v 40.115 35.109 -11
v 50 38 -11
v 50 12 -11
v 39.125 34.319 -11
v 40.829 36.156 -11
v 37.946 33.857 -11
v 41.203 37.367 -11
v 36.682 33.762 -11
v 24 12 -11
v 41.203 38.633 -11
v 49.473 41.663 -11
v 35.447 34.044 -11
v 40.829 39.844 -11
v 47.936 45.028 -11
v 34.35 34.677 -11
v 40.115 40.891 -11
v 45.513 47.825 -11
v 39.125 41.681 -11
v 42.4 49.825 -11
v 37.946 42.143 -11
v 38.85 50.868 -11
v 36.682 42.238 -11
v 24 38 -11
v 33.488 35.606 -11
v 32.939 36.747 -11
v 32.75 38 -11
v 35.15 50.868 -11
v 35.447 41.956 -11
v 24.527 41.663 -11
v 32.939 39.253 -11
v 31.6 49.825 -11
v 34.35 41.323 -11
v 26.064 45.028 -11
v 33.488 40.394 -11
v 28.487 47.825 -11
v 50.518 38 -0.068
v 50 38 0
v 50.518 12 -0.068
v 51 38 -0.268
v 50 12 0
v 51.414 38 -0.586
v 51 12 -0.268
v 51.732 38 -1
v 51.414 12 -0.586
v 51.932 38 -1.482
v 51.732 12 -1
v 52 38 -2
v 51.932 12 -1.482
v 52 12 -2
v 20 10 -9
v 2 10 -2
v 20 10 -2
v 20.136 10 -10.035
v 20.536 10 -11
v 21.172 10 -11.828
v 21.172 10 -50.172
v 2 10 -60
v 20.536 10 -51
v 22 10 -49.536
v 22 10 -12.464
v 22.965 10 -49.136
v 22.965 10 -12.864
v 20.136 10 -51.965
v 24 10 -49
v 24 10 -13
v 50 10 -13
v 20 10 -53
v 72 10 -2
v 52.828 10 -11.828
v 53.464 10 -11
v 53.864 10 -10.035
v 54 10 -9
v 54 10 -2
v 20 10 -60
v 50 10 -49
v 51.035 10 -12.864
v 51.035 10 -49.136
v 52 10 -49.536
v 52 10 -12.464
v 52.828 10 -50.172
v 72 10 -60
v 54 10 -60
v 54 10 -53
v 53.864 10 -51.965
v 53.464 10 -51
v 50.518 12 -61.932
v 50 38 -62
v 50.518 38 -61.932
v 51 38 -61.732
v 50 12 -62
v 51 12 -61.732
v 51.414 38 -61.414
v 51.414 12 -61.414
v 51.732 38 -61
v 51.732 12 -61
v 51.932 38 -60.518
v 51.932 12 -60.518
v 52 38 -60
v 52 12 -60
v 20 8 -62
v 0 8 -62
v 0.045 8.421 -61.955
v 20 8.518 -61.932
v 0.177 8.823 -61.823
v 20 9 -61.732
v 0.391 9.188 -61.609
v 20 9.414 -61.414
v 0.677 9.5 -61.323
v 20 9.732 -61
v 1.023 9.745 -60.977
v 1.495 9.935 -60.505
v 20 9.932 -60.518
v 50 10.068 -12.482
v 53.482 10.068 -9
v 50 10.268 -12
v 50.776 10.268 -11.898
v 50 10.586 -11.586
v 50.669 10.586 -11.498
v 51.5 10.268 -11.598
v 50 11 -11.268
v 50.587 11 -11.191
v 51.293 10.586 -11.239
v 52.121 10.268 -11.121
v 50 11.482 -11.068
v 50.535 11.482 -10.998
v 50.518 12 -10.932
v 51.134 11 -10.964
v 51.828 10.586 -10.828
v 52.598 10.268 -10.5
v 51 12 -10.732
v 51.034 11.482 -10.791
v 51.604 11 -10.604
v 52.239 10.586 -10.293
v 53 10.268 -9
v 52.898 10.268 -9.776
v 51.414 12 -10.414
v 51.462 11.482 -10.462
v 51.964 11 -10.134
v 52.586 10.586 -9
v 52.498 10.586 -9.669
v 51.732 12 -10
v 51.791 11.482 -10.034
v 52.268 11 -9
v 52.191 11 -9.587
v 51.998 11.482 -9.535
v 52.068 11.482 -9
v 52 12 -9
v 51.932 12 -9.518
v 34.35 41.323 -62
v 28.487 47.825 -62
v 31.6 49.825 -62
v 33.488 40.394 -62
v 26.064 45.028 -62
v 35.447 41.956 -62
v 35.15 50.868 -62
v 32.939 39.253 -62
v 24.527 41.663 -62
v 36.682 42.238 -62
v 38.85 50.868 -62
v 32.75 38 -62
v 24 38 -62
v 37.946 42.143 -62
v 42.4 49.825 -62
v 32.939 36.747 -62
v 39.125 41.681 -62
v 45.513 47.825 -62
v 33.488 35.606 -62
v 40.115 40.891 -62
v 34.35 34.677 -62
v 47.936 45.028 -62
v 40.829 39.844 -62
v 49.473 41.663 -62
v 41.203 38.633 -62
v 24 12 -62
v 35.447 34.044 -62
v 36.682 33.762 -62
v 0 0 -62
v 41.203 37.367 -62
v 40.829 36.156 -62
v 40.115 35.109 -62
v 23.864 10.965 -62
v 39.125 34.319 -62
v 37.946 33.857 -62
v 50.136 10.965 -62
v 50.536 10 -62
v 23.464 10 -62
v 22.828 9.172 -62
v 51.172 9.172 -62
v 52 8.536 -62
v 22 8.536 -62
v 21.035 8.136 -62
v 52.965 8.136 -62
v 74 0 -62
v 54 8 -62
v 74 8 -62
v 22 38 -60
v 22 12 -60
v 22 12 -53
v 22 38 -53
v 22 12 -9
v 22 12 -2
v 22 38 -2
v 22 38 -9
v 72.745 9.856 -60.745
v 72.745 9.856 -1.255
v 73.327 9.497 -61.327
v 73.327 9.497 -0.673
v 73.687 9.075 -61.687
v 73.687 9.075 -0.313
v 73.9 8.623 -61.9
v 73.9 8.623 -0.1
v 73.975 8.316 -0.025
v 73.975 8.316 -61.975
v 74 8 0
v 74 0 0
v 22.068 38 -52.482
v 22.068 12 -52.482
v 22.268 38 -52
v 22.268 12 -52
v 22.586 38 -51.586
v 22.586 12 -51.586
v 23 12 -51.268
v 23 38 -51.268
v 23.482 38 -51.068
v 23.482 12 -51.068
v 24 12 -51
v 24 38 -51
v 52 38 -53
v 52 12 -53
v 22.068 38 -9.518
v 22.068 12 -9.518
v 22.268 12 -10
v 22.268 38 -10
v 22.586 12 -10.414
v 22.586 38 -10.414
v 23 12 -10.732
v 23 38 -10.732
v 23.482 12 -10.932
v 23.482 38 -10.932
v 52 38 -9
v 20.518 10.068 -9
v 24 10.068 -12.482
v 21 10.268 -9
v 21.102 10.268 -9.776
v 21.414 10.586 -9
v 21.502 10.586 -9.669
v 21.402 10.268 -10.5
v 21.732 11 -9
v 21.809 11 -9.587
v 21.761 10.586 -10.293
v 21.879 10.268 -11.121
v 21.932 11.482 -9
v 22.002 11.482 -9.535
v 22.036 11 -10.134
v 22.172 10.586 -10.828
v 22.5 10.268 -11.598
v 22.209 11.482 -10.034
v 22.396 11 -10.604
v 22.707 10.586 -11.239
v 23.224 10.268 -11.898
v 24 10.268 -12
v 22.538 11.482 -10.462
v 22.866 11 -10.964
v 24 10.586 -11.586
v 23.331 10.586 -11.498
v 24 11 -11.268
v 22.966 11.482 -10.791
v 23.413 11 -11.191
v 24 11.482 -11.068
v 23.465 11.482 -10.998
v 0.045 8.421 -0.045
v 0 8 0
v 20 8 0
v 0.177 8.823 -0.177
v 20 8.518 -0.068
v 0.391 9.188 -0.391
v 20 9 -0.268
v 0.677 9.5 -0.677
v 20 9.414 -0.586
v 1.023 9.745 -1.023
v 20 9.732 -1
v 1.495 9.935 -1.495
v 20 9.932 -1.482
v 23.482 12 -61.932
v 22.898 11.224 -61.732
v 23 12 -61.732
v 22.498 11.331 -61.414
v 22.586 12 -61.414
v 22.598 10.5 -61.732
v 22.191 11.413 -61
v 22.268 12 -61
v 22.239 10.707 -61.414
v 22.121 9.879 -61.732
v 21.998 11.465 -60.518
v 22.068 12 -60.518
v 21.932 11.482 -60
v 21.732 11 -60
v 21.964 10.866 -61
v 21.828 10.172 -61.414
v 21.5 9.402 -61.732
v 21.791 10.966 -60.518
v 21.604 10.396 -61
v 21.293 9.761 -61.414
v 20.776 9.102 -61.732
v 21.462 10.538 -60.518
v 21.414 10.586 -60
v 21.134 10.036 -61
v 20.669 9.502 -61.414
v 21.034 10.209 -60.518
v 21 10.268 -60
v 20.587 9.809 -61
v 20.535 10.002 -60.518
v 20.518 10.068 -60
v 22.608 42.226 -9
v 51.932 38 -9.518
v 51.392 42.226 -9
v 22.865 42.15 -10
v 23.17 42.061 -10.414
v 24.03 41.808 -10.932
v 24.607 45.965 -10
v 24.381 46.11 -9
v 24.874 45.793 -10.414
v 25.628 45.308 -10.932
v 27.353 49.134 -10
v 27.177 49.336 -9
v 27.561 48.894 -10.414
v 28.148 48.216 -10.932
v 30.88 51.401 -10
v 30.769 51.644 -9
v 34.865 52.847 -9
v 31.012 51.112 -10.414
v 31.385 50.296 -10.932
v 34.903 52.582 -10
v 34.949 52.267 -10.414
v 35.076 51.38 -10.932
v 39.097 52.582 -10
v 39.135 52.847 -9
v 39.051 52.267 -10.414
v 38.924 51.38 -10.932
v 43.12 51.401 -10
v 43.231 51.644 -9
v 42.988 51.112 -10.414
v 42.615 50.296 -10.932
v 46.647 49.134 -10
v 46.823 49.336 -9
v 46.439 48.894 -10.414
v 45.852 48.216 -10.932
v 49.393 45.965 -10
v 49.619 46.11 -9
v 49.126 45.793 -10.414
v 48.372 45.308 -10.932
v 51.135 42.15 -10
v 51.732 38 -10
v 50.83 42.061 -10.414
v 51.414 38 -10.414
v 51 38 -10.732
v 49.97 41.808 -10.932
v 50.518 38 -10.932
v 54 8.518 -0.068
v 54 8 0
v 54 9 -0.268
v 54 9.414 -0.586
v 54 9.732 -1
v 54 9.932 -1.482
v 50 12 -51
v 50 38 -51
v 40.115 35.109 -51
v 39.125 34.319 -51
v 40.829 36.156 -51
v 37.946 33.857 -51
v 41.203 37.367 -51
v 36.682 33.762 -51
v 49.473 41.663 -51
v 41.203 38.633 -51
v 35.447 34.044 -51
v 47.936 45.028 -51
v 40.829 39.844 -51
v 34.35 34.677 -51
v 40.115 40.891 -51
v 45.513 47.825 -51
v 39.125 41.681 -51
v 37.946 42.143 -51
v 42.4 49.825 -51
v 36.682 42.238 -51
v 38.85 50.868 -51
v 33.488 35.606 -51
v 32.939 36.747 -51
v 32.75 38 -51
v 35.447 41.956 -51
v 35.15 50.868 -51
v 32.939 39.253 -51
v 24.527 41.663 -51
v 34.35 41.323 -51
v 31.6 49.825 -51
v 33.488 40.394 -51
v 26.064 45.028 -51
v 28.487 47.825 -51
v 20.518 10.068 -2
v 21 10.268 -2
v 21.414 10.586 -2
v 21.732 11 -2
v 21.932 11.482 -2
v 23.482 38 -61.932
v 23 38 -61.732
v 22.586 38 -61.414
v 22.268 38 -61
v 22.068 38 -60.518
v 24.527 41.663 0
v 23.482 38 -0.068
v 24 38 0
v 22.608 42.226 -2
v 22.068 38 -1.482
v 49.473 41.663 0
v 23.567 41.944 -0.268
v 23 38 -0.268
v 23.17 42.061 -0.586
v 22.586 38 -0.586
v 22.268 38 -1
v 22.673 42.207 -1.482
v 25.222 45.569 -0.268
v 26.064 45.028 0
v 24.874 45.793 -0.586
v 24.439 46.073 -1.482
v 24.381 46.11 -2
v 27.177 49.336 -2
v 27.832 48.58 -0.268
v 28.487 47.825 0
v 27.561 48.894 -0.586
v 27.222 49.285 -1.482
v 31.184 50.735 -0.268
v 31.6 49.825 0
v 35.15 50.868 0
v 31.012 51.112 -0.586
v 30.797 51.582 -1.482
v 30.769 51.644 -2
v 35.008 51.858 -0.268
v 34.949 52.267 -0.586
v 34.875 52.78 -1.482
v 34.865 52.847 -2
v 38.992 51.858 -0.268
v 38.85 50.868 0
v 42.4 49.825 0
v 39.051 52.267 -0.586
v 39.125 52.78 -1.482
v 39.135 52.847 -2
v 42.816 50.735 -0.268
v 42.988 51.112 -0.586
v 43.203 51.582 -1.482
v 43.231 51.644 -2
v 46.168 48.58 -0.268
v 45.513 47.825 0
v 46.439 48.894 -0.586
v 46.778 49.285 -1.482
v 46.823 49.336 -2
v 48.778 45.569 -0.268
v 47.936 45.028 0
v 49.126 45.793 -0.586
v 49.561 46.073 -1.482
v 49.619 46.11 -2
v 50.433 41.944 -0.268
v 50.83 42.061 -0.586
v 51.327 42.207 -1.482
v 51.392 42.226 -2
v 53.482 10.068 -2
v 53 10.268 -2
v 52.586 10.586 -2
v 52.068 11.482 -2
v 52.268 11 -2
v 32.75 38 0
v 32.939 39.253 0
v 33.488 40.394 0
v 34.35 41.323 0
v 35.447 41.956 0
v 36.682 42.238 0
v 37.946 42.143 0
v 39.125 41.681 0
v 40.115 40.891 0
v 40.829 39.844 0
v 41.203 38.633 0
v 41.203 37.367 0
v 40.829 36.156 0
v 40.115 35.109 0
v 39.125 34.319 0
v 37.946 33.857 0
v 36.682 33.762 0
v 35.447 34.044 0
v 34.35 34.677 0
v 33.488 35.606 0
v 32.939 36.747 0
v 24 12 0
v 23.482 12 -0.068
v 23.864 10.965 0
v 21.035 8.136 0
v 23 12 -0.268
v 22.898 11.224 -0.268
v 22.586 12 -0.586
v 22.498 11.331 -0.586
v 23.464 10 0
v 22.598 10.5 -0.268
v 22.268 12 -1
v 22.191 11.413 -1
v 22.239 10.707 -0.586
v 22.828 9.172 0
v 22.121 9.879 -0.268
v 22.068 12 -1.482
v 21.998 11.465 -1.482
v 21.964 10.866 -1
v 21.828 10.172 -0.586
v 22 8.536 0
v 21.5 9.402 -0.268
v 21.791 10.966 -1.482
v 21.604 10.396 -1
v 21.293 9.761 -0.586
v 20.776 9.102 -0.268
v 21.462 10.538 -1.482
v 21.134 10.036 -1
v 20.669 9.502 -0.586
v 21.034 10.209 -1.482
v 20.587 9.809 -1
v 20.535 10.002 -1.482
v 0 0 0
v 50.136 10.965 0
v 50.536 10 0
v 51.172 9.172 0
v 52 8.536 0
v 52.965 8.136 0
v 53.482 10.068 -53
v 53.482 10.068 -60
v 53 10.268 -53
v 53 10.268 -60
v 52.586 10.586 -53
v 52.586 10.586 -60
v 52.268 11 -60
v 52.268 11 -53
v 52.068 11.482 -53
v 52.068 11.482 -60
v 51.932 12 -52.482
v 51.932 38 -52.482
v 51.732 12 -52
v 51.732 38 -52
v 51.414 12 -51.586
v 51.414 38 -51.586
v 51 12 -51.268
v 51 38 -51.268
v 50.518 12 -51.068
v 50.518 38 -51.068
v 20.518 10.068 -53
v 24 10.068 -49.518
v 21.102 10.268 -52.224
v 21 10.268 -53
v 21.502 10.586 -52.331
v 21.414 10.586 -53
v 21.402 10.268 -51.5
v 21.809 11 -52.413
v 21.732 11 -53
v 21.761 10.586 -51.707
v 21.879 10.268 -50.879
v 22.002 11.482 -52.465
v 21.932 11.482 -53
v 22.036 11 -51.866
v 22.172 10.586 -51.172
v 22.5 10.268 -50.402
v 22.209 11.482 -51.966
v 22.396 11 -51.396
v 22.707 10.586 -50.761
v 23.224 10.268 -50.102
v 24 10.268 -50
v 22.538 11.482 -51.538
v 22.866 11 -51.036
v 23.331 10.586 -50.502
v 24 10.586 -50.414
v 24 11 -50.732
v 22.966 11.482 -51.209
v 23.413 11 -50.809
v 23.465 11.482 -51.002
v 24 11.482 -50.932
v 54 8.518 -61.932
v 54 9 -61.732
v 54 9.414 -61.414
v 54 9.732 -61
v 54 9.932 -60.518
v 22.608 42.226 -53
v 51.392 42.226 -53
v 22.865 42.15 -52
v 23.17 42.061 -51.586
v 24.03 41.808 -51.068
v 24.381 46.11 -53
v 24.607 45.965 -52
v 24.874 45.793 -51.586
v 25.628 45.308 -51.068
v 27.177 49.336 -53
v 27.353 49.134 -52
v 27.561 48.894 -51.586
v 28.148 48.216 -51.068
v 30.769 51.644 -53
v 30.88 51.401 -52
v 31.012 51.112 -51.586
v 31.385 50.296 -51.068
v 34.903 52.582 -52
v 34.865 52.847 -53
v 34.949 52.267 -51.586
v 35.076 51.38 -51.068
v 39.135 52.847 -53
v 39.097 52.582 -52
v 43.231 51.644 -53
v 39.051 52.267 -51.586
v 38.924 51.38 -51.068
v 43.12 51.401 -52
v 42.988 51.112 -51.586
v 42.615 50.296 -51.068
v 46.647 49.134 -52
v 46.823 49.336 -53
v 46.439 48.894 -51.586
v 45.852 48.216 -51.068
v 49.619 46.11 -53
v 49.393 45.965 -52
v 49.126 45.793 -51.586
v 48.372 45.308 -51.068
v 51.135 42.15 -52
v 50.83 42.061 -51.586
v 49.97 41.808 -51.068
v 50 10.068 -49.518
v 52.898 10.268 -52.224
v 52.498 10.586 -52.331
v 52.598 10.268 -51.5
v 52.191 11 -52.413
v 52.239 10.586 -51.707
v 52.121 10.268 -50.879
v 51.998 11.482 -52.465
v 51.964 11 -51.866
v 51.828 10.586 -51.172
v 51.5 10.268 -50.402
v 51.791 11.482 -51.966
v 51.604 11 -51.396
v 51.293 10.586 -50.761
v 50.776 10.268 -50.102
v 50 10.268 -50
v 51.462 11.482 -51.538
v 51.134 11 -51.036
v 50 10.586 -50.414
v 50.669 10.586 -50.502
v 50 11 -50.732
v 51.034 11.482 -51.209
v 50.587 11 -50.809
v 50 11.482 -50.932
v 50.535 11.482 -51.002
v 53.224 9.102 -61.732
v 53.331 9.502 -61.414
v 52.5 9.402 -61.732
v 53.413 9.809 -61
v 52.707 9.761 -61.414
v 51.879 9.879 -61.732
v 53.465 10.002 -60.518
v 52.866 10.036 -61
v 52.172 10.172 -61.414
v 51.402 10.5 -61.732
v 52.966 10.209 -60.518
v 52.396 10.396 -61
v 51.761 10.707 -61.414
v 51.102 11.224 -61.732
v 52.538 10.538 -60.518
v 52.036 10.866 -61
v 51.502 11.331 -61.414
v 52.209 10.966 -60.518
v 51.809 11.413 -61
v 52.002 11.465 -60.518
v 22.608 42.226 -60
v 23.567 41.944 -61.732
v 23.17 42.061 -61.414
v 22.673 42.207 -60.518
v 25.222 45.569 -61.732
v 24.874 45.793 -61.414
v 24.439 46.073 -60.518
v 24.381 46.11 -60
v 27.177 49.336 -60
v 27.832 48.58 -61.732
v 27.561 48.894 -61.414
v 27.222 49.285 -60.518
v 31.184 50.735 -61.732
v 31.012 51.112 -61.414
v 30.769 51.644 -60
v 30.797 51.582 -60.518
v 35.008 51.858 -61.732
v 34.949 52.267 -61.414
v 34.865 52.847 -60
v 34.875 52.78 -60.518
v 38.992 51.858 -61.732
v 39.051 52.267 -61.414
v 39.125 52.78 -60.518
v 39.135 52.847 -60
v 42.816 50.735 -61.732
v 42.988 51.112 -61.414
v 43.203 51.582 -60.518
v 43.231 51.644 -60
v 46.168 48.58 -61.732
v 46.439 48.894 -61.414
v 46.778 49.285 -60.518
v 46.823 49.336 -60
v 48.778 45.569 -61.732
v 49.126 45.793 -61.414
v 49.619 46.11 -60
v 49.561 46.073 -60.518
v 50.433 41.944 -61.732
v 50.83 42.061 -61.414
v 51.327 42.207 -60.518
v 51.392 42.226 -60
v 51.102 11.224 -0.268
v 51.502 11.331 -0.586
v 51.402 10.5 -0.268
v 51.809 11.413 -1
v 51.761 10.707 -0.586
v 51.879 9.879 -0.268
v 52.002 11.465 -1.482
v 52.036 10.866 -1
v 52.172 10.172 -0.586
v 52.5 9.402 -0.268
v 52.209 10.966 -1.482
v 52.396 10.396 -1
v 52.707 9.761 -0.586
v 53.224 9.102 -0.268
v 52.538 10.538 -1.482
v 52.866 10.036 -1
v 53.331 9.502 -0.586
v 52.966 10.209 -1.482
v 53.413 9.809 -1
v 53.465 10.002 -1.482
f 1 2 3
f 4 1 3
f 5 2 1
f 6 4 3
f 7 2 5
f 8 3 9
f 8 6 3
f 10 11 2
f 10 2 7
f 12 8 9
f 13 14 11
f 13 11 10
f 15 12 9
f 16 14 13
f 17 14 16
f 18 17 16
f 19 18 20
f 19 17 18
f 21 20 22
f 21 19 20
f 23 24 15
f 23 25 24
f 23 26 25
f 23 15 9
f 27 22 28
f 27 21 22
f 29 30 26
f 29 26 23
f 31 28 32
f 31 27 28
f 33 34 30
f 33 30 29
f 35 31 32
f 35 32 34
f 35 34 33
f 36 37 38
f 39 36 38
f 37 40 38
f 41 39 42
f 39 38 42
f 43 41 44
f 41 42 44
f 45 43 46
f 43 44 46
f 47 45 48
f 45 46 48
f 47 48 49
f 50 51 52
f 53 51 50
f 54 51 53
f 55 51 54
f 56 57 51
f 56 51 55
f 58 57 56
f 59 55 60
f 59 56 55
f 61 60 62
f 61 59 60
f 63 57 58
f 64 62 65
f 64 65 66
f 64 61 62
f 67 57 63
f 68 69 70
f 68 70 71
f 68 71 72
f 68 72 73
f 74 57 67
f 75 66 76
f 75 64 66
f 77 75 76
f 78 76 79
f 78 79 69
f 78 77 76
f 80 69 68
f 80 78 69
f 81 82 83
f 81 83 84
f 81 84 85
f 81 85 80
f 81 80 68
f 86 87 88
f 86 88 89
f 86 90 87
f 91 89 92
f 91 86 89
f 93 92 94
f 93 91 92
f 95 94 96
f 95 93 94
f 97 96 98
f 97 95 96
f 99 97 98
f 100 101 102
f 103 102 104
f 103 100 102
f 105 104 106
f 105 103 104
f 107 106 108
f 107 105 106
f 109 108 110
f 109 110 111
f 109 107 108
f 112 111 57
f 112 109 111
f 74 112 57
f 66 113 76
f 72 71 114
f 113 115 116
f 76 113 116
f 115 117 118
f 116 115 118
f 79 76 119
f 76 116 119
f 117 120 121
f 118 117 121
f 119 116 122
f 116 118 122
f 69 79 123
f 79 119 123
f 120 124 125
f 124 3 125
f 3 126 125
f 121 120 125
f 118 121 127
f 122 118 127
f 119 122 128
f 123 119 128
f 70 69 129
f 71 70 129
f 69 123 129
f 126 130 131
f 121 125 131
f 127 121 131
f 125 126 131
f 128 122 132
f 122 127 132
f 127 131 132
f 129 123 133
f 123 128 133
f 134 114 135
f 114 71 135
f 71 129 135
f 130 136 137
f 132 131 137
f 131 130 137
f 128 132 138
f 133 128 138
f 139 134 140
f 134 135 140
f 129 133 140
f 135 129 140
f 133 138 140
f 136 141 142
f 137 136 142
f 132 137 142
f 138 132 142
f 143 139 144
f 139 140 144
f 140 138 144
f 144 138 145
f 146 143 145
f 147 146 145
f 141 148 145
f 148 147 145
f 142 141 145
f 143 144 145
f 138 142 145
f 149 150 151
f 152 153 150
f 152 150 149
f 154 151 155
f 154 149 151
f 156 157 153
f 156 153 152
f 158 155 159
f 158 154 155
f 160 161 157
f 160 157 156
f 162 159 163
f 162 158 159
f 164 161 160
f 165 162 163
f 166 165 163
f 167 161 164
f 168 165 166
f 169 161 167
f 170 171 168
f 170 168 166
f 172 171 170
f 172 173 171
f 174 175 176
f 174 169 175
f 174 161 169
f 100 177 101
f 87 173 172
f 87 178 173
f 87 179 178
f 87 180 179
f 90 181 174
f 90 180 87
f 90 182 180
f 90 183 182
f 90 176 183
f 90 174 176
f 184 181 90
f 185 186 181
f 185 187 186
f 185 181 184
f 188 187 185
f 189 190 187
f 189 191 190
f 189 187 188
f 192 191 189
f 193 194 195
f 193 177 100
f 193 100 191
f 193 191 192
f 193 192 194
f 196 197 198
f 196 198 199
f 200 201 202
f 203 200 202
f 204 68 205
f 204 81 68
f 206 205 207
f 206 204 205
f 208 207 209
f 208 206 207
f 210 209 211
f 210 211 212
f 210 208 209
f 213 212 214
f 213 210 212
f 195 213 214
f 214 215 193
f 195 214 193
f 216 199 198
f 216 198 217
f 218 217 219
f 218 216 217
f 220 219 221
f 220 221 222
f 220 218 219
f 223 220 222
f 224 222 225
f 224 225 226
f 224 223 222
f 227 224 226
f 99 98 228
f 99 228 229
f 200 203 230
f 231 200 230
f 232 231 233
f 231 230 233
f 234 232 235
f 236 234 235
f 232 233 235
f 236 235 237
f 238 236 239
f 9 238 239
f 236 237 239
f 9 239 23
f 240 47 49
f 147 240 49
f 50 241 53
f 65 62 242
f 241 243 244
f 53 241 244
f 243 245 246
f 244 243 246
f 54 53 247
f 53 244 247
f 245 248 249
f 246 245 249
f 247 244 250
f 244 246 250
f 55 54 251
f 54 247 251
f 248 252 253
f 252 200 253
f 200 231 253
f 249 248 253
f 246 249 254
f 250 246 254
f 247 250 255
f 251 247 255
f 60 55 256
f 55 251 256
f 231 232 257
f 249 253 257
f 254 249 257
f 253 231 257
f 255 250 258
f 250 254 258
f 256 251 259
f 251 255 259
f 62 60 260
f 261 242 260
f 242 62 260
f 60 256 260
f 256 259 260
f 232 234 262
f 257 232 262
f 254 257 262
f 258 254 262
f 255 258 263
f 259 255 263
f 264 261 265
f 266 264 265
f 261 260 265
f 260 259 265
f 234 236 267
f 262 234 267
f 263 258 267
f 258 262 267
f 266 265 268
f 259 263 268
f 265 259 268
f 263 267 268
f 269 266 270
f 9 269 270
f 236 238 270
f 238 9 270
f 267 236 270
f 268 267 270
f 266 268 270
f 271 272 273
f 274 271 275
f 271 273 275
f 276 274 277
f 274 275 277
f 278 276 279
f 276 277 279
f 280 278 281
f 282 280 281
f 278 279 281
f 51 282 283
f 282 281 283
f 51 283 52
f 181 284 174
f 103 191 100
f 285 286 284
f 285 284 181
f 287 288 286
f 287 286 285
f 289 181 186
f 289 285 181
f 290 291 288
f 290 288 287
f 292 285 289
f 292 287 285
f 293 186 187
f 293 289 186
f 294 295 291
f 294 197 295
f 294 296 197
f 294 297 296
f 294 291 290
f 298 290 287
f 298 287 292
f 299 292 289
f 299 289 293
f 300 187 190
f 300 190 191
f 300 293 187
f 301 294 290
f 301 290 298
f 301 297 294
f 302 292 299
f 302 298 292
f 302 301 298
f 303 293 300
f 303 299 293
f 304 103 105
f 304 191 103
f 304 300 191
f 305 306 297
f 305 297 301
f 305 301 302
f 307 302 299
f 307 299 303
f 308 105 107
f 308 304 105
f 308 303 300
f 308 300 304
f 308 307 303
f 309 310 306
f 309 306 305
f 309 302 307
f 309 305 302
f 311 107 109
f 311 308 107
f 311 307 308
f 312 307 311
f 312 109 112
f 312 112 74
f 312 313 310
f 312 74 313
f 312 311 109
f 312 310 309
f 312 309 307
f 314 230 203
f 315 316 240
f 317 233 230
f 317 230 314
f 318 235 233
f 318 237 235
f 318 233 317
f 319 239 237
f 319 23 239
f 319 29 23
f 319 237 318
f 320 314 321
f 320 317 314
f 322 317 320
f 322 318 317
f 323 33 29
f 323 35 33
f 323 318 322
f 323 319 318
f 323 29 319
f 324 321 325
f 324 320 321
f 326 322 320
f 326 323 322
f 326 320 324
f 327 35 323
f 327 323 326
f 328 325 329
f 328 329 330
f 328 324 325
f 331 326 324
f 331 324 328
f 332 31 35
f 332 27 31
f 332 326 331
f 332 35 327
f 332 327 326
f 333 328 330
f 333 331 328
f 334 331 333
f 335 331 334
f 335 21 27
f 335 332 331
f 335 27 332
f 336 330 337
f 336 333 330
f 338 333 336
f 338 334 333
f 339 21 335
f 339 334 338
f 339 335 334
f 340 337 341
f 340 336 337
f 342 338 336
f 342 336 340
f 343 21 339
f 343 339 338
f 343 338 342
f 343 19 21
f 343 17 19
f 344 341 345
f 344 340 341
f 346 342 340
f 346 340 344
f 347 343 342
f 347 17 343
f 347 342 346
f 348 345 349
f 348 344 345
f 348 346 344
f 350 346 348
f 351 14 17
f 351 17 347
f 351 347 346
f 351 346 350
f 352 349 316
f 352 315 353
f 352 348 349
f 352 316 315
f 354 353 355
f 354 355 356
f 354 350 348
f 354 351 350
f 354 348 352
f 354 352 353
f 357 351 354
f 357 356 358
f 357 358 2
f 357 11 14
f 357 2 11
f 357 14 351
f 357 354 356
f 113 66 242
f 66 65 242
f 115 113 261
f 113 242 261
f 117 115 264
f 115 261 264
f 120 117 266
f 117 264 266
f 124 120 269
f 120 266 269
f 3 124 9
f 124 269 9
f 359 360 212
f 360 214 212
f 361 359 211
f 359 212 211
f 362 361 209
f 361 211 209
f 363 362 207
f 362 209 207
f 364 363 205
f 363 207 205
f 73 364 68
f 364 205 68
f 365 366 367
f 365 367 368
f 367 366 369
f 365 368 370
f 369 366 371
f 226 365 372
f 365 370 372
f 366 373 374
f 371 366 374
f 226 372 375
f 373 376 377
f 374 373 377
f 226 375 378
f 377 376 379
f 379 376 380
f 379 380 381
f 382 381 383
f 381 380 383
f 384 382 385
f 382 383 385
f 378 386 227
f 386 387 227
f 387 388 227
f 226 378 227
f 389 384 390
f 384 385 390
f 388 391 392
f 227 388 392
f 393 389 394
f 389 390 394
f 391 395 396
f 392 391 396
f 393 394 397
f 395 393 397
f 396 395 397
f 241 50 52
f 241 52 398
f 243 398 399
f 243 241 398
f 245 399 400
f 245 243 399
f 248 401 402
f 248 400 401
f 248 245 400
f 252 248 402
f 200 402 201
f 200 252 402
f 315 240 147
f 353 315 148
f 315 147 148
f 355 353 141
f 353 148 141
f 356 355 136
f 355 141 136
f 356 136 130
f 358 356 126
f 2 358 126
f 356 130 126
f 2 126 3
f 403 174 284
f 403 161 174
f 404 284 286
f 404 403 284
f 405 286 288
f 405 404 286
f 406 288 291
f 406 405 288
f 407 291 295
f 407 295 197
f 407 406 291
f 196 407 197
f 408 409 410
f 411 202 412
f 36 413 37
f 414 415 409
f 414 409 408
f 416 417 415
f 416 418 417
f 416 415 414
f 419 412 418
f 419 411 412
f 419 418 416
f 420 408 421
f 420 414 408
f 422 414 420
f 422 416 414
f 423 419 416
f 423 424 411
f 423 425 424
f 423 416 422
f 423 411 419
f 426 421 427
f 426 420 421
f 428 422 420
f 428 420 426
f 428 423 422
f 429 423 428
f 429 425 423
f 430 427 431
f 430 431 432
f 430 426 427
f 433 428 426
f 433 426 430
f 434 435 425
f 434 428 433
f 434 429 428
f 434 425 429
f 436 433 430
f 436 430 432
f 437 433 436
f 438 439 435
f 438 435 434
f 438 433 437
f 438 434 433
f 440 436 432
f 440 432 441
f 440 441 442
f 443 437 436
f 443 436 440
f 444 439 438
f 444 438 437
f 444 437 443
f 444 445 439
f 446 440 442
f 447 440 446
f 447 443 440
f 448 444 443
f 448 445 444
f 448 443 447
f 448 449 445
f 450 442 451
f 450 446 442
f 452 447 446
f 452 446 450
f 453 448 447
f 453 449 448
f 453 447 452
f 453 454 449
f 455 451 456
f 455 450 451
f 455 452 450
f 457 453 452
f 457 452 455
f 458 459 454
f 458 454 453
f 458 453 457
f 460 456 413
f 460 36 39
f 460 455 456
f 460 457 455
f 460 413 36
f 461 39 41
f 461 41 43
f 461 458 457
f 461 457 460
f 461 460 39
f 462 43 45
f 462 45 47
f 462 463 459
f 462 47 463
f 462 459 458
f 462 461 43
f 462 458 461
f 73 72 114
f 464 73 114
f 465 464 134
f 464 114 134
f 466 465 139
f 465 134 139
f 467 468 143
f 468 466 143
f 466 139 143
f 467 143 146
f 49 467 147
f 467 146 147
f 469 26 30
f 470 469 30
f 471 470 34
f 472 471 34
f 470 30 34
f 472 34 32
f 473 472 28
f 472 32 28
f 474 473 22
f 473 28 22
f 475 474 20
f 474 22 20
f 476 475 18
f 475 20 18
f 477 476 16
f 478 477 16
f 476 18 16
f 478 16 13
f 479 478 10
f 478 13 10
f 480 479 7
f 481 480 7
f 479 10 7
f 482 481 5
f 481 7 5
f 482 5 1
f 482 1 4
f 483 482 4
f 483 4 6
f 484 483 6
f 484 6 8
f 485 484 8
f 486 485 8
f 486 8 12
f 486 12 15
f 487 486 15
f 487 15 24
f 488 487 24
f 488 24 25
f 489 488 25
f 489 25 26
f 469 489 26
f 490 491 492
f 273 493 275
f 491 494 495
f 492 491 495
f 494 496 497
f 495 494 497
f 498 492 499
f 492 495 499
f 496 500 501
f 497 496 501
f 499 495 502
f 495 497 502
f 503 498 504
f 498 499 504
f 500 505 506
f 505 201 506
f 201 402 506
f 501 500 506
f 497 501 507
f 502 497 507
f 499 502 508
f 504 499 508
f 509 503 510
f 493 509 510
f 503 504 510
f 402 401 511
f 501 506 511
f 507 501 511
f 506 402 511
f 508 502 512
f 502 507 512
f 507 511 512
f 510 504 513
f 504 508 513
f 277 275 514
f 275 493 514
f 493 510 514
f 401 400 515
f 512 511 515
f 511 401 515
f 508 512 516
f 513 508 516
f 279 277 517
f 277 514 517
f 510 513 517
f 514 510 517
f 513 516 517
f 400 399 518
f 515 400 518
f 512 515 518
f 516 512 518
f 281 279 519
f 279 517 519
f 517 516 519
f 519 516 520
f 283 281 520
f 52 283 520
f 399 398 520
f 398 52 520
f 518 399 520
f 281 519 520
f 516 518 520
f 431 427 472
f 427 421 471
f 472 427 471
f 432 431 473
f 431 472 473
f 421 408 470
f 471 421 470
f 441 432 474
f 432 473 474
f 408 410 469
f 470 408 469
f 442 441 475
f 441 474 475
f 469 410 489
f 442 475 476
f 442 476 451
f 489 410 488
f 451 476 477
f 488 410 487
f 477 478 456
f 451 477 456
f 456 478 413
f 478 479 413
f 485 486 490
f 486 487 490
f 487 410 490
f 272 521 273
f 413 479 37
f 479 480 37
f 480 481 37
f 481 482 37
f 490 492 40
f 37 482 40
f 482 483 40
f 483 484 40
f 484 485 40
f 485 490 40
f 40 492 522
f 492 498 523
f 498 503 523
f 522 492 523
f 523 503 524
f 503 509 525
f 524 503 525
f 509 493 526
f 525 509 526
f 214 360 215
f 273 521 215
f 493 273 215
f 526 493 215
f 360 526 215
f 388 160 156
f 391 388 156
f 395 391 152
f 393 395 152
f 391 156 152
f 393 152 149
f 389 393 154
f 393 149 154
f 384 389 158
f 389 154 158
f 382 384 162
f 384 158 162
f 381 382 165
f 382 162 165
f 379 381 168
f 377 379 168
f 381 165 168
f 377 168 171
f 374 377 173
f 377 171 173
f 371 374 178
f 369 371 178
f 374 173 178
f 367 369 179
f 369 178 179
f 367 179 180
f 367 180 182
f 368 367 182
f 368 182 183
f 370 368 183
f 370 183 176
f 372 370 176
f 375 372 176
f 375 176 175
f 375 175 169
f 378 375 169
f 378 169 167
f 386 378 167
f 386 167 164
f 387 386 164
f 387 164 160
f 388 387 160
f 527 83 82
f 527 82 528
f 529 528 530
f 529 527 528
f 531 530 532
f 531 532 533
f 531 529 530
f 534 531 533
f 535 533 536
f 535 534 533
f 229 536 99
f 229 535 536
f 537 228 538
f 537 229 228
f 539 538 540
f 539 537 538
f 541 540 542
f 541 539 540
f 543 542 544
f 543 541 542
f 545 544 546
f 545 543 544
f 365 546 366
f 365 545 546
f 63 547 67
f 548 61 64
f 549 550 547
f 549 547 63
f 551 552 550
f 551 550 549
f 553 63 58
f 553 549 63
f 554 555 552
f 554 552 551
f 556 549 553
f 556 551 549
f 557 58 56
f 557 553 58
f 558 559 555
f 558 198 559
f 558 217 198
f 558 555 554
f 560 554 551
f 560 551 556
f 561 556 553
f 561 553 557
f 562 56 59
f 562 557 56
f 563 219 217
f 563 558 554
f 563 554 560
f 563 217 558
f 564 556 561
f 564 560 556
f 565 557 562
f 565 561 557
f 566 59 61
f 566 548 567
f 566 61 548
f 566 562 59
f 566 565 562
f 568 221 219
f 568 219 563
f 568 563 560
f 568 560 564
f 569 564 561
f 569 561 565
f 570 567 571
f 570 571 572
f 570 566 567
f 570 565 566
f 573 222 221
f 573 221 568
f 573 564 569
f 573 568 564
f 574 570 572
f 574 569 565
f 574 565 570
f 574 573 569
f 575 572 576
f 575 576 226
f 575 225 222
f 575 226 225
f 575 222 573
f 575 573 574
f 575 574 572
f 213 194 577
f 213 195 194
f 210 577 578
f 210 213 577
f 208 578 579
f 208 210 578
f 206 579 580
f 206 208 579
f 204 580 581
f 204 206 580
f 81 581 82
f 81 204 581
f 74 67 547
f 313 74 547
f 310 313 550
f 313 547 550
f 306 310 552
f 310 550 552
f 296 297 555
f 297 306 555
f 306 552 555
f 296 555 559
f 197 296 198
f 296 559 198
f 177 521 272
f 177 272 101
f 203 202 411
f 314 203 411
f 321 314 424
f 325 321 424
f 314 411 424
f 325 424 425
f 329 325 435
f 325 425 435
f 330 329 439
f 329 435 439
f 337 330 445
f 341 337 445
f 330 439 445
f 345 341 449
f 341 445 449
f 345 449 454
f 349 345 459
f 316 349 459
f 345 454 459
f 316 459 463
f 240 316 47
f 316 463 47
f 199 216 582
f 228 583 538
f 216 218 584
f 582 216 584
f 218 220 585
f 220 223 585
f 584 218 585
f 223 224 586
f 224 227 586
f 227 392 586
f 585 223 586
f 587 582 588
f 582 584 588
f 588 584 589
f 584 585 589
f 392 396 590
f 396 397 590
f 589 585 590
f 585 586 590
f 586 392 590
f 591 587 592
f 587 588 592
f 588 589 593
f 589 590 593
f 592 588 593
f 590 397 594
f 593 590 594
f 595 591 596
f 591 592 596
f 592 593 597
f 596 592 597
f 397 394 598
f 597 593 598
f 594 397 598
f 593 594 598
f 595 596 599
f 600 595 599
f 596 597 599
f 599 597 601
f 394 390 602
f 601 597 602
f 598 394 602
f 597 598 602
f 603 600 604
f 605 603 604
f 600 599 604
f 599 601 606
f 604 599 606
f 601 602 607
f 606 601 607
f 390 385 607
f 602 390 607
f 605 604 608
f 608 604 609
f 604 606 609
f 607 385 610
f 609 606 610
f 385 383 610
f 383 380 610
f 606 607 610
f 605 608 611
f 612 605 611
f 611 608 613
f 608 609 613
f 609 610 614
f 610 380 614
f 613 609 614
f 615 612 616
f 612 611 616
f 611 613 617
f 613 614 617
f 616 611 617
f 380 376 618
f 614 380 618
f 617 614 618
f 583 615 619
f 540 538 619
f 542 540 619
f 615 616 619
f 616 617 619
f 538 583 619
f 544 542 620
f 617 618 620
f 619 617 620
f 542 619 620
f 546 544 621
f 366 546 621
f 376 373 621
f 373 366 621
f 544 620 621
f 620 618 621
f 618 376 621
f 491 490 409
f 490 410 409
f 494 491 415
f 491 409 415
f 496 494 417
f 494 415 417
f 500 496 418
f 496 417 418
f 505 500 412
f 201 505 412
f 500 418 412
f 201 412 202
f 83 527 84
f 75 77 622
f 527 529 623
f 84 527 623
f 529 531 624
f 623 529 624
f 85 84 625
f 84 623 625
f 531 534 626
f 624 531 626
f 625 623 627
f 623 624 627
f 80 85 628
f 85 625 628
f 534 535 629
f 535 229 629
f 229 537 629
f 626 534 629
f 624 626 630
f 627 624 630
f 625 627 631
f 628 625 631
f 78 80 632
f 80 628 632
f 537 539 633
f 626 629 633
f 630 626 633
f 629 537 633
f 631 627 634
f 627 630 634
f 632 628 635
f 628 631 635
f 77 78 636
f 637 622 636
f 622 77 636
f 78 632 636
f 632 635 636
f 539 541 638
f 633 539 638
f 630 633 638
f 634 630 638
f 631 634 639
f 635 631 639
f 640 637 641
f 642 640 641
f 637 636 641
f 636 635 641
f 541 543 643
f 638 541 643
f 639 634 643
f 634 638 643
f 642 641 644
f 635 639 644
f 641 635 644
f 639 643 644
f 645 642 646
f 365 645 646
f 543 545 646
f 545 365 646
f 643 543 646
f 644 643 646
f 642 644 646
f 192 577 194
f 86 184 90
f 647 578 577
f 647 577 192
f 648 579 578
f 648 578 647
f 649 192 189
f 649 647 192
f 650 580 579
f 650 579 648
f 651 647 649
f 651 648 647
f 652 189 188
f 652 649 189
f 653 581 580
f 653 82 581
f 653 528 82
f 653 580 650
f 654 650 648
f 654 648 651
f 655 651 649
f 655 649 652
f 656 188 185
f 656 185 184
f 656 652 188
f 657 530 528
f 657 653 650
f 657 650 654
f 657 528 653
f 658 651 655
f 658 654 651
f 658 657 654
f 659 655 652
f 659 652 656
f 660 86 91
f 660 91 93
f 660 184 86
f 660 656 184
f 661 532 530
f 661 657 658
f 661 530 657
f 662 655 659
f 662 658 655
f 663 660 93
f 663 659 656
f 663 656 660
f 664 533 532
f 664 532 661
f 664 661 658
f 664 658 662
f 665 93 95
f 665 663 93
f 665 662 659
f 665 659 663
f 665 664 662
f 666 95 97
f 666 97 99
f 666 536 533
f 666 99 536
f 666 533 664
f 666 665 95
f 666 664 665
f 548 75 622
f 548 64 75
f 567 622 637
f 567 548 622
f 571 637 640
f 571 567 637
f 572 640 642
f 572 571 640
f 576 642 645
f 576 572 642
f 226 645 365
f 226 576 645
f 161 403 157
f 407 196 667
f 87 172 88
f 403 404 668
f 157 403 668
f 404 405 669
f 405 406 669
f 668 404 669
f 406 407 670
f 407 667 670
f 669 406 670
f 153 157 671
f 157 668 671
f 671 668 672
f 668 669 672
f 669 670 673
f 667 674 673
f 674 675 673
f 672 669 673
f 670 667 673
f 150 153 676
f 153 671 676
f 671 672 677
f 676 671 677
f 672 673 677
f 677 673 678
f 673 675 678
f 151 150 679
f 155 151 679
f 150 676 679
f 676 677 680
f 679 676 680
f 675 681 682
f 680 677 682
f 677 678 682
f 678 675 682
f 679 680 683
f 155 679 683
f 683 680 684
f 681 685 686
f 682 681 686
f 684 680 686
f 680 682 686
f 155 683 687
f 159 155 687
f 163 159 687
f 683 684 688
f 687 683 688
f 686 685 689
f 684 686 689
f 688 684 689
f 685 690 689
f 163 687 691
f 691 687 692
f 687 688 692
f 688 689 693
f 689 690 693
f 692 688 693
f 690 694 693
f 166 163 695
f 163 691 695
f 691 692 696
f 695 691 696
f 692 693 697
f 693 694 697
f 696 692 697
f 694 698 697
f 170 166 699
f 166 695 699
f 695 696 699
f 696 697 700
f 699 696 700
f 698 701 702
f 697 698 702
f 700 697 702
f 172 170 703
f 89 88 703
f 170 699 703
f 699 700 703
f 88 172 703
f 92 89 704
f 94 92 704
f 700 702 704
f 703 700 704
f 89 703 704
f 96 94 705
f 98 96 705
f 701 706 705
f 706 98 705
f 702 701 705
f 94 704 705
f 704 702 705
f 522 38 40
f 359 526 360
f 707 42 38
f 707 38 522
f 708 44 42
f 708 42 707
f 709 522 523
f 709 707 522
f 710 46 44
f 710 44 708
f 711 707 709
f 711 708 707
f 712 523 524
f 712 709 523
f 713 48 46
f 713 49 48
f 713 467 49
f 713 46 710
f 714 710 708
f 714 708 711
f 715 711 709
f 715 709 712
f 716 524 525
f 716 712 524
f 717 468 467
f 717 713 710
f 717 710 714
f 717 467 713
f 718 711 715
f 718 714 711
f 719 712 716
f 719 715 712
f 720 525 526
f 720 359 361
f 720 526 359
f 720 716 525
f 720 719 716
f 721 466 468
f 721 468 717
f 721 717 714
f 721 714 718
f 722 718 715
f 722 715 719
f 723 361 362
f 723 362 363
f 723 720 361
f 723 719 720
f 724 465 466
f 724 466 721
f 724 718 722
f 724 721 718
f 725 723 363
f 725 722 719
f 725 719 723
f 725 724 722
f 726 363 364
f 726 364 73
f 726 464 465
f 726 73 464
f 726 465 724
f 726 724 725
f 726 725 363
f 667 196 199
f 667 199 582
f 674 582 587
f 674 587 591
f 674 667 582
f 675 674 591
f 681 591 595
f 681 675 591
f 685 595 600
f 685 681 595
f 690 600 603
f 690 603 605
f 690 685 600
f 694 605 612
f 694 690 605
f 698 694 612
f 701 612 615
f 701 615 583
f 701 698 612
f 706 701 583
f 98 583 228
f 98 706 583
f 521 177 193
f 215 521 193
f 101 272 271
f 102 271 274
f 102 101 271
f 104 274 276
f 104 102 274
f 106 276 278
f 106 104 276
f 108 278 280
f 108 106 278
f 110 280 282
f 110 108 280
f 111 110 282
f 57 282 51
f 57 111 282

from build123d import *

# Parameters (mm, degrees)
SKETCH2_W           = 74
SKETCH2_H           = 62
BOSS_EXTRUDE1_DEPTH = 10
BOSS_EXTRUDE2_DEPTH = 11
SKETCH5_R           = 4.25
CUT_EXTRUDE2_DEPTH  = 75
FILLET1_R           = 2


with BuildPart() as part:
    # Sketch2 → Boss-Extrude1 (new body)
    with BuildSketch(Plane(origin=(0, 0, 0), x_dir=(1, 0, 0), z_dir=(0, 1, 0))):
        with Locations((37, 31)):
            Rectangle(SKETCH2_W, SKETCH2_H)
    extrude(amount=BOSS_EXTRUDE1_DEPTH)

    # Sketch3 → Boss-Extrude2 (add)
    with BuildSketch(Plane.XY):
        with BuildLine():
            Line((22, 10), (22, 38))
            ThreePointArc((22, 38), (37, 53), (52, 38))
            Line((52, 38), (52, 10))
            Line((52, 10), (22, 10))
        make_face()
    boss_extrude2 = extrude(amount=-BOSS_EXTRUDE2_DEPTH)

    # Mirror1: Boss-Extrude2 across plane
    add(boss_extrude2.mirror(Plane.XY.offset(-31)))

    # Sketch5 → Cut-Extrude2 (cut)
    with BuildSketch(Plane(origin=(0, 0, -62), x_dir=(-1, 0, 0), z_dir=(0, 0, -1))):
        with Locations((-37, 38)):
            Circle(SKETCH5_R)
    extrude(amount=-CUT_EXTRUDE2_DEPTH, mode=Mode.SUBTRACT)

    # Fillet1
    fillet1_edges = [part.edges().sort_by_distance(p)[0] for p in [
        (74, 10, -31),
        (63, 10, -62),
        (63, 10, 0),
        (37, 10, -11),
        (52, 10, -5.5),
        (22, 24, -11),
        (22, 10, -5.5),
        (37, 53, -11),
        (52, 24, -11),
        (52, 24, 0),
        (37, 53, 0),
        (22, 24, 0),
        (11, 10, -62),
        (22, 10, -56.5),
        (52, 24, -62),
        (52, 10, -56.5),
        (37, 53, -62),
        (0, 10, -31),
        (22, 24, -62),
        (37, 10, -51),
        (52, 24, -51),
        (37, 53, -51),
        (22, 24, -51),
        (11, 10, 0),
    ]]
    fillet(fillet1_edges, radius=FILLET1_R)


solid = part.part
